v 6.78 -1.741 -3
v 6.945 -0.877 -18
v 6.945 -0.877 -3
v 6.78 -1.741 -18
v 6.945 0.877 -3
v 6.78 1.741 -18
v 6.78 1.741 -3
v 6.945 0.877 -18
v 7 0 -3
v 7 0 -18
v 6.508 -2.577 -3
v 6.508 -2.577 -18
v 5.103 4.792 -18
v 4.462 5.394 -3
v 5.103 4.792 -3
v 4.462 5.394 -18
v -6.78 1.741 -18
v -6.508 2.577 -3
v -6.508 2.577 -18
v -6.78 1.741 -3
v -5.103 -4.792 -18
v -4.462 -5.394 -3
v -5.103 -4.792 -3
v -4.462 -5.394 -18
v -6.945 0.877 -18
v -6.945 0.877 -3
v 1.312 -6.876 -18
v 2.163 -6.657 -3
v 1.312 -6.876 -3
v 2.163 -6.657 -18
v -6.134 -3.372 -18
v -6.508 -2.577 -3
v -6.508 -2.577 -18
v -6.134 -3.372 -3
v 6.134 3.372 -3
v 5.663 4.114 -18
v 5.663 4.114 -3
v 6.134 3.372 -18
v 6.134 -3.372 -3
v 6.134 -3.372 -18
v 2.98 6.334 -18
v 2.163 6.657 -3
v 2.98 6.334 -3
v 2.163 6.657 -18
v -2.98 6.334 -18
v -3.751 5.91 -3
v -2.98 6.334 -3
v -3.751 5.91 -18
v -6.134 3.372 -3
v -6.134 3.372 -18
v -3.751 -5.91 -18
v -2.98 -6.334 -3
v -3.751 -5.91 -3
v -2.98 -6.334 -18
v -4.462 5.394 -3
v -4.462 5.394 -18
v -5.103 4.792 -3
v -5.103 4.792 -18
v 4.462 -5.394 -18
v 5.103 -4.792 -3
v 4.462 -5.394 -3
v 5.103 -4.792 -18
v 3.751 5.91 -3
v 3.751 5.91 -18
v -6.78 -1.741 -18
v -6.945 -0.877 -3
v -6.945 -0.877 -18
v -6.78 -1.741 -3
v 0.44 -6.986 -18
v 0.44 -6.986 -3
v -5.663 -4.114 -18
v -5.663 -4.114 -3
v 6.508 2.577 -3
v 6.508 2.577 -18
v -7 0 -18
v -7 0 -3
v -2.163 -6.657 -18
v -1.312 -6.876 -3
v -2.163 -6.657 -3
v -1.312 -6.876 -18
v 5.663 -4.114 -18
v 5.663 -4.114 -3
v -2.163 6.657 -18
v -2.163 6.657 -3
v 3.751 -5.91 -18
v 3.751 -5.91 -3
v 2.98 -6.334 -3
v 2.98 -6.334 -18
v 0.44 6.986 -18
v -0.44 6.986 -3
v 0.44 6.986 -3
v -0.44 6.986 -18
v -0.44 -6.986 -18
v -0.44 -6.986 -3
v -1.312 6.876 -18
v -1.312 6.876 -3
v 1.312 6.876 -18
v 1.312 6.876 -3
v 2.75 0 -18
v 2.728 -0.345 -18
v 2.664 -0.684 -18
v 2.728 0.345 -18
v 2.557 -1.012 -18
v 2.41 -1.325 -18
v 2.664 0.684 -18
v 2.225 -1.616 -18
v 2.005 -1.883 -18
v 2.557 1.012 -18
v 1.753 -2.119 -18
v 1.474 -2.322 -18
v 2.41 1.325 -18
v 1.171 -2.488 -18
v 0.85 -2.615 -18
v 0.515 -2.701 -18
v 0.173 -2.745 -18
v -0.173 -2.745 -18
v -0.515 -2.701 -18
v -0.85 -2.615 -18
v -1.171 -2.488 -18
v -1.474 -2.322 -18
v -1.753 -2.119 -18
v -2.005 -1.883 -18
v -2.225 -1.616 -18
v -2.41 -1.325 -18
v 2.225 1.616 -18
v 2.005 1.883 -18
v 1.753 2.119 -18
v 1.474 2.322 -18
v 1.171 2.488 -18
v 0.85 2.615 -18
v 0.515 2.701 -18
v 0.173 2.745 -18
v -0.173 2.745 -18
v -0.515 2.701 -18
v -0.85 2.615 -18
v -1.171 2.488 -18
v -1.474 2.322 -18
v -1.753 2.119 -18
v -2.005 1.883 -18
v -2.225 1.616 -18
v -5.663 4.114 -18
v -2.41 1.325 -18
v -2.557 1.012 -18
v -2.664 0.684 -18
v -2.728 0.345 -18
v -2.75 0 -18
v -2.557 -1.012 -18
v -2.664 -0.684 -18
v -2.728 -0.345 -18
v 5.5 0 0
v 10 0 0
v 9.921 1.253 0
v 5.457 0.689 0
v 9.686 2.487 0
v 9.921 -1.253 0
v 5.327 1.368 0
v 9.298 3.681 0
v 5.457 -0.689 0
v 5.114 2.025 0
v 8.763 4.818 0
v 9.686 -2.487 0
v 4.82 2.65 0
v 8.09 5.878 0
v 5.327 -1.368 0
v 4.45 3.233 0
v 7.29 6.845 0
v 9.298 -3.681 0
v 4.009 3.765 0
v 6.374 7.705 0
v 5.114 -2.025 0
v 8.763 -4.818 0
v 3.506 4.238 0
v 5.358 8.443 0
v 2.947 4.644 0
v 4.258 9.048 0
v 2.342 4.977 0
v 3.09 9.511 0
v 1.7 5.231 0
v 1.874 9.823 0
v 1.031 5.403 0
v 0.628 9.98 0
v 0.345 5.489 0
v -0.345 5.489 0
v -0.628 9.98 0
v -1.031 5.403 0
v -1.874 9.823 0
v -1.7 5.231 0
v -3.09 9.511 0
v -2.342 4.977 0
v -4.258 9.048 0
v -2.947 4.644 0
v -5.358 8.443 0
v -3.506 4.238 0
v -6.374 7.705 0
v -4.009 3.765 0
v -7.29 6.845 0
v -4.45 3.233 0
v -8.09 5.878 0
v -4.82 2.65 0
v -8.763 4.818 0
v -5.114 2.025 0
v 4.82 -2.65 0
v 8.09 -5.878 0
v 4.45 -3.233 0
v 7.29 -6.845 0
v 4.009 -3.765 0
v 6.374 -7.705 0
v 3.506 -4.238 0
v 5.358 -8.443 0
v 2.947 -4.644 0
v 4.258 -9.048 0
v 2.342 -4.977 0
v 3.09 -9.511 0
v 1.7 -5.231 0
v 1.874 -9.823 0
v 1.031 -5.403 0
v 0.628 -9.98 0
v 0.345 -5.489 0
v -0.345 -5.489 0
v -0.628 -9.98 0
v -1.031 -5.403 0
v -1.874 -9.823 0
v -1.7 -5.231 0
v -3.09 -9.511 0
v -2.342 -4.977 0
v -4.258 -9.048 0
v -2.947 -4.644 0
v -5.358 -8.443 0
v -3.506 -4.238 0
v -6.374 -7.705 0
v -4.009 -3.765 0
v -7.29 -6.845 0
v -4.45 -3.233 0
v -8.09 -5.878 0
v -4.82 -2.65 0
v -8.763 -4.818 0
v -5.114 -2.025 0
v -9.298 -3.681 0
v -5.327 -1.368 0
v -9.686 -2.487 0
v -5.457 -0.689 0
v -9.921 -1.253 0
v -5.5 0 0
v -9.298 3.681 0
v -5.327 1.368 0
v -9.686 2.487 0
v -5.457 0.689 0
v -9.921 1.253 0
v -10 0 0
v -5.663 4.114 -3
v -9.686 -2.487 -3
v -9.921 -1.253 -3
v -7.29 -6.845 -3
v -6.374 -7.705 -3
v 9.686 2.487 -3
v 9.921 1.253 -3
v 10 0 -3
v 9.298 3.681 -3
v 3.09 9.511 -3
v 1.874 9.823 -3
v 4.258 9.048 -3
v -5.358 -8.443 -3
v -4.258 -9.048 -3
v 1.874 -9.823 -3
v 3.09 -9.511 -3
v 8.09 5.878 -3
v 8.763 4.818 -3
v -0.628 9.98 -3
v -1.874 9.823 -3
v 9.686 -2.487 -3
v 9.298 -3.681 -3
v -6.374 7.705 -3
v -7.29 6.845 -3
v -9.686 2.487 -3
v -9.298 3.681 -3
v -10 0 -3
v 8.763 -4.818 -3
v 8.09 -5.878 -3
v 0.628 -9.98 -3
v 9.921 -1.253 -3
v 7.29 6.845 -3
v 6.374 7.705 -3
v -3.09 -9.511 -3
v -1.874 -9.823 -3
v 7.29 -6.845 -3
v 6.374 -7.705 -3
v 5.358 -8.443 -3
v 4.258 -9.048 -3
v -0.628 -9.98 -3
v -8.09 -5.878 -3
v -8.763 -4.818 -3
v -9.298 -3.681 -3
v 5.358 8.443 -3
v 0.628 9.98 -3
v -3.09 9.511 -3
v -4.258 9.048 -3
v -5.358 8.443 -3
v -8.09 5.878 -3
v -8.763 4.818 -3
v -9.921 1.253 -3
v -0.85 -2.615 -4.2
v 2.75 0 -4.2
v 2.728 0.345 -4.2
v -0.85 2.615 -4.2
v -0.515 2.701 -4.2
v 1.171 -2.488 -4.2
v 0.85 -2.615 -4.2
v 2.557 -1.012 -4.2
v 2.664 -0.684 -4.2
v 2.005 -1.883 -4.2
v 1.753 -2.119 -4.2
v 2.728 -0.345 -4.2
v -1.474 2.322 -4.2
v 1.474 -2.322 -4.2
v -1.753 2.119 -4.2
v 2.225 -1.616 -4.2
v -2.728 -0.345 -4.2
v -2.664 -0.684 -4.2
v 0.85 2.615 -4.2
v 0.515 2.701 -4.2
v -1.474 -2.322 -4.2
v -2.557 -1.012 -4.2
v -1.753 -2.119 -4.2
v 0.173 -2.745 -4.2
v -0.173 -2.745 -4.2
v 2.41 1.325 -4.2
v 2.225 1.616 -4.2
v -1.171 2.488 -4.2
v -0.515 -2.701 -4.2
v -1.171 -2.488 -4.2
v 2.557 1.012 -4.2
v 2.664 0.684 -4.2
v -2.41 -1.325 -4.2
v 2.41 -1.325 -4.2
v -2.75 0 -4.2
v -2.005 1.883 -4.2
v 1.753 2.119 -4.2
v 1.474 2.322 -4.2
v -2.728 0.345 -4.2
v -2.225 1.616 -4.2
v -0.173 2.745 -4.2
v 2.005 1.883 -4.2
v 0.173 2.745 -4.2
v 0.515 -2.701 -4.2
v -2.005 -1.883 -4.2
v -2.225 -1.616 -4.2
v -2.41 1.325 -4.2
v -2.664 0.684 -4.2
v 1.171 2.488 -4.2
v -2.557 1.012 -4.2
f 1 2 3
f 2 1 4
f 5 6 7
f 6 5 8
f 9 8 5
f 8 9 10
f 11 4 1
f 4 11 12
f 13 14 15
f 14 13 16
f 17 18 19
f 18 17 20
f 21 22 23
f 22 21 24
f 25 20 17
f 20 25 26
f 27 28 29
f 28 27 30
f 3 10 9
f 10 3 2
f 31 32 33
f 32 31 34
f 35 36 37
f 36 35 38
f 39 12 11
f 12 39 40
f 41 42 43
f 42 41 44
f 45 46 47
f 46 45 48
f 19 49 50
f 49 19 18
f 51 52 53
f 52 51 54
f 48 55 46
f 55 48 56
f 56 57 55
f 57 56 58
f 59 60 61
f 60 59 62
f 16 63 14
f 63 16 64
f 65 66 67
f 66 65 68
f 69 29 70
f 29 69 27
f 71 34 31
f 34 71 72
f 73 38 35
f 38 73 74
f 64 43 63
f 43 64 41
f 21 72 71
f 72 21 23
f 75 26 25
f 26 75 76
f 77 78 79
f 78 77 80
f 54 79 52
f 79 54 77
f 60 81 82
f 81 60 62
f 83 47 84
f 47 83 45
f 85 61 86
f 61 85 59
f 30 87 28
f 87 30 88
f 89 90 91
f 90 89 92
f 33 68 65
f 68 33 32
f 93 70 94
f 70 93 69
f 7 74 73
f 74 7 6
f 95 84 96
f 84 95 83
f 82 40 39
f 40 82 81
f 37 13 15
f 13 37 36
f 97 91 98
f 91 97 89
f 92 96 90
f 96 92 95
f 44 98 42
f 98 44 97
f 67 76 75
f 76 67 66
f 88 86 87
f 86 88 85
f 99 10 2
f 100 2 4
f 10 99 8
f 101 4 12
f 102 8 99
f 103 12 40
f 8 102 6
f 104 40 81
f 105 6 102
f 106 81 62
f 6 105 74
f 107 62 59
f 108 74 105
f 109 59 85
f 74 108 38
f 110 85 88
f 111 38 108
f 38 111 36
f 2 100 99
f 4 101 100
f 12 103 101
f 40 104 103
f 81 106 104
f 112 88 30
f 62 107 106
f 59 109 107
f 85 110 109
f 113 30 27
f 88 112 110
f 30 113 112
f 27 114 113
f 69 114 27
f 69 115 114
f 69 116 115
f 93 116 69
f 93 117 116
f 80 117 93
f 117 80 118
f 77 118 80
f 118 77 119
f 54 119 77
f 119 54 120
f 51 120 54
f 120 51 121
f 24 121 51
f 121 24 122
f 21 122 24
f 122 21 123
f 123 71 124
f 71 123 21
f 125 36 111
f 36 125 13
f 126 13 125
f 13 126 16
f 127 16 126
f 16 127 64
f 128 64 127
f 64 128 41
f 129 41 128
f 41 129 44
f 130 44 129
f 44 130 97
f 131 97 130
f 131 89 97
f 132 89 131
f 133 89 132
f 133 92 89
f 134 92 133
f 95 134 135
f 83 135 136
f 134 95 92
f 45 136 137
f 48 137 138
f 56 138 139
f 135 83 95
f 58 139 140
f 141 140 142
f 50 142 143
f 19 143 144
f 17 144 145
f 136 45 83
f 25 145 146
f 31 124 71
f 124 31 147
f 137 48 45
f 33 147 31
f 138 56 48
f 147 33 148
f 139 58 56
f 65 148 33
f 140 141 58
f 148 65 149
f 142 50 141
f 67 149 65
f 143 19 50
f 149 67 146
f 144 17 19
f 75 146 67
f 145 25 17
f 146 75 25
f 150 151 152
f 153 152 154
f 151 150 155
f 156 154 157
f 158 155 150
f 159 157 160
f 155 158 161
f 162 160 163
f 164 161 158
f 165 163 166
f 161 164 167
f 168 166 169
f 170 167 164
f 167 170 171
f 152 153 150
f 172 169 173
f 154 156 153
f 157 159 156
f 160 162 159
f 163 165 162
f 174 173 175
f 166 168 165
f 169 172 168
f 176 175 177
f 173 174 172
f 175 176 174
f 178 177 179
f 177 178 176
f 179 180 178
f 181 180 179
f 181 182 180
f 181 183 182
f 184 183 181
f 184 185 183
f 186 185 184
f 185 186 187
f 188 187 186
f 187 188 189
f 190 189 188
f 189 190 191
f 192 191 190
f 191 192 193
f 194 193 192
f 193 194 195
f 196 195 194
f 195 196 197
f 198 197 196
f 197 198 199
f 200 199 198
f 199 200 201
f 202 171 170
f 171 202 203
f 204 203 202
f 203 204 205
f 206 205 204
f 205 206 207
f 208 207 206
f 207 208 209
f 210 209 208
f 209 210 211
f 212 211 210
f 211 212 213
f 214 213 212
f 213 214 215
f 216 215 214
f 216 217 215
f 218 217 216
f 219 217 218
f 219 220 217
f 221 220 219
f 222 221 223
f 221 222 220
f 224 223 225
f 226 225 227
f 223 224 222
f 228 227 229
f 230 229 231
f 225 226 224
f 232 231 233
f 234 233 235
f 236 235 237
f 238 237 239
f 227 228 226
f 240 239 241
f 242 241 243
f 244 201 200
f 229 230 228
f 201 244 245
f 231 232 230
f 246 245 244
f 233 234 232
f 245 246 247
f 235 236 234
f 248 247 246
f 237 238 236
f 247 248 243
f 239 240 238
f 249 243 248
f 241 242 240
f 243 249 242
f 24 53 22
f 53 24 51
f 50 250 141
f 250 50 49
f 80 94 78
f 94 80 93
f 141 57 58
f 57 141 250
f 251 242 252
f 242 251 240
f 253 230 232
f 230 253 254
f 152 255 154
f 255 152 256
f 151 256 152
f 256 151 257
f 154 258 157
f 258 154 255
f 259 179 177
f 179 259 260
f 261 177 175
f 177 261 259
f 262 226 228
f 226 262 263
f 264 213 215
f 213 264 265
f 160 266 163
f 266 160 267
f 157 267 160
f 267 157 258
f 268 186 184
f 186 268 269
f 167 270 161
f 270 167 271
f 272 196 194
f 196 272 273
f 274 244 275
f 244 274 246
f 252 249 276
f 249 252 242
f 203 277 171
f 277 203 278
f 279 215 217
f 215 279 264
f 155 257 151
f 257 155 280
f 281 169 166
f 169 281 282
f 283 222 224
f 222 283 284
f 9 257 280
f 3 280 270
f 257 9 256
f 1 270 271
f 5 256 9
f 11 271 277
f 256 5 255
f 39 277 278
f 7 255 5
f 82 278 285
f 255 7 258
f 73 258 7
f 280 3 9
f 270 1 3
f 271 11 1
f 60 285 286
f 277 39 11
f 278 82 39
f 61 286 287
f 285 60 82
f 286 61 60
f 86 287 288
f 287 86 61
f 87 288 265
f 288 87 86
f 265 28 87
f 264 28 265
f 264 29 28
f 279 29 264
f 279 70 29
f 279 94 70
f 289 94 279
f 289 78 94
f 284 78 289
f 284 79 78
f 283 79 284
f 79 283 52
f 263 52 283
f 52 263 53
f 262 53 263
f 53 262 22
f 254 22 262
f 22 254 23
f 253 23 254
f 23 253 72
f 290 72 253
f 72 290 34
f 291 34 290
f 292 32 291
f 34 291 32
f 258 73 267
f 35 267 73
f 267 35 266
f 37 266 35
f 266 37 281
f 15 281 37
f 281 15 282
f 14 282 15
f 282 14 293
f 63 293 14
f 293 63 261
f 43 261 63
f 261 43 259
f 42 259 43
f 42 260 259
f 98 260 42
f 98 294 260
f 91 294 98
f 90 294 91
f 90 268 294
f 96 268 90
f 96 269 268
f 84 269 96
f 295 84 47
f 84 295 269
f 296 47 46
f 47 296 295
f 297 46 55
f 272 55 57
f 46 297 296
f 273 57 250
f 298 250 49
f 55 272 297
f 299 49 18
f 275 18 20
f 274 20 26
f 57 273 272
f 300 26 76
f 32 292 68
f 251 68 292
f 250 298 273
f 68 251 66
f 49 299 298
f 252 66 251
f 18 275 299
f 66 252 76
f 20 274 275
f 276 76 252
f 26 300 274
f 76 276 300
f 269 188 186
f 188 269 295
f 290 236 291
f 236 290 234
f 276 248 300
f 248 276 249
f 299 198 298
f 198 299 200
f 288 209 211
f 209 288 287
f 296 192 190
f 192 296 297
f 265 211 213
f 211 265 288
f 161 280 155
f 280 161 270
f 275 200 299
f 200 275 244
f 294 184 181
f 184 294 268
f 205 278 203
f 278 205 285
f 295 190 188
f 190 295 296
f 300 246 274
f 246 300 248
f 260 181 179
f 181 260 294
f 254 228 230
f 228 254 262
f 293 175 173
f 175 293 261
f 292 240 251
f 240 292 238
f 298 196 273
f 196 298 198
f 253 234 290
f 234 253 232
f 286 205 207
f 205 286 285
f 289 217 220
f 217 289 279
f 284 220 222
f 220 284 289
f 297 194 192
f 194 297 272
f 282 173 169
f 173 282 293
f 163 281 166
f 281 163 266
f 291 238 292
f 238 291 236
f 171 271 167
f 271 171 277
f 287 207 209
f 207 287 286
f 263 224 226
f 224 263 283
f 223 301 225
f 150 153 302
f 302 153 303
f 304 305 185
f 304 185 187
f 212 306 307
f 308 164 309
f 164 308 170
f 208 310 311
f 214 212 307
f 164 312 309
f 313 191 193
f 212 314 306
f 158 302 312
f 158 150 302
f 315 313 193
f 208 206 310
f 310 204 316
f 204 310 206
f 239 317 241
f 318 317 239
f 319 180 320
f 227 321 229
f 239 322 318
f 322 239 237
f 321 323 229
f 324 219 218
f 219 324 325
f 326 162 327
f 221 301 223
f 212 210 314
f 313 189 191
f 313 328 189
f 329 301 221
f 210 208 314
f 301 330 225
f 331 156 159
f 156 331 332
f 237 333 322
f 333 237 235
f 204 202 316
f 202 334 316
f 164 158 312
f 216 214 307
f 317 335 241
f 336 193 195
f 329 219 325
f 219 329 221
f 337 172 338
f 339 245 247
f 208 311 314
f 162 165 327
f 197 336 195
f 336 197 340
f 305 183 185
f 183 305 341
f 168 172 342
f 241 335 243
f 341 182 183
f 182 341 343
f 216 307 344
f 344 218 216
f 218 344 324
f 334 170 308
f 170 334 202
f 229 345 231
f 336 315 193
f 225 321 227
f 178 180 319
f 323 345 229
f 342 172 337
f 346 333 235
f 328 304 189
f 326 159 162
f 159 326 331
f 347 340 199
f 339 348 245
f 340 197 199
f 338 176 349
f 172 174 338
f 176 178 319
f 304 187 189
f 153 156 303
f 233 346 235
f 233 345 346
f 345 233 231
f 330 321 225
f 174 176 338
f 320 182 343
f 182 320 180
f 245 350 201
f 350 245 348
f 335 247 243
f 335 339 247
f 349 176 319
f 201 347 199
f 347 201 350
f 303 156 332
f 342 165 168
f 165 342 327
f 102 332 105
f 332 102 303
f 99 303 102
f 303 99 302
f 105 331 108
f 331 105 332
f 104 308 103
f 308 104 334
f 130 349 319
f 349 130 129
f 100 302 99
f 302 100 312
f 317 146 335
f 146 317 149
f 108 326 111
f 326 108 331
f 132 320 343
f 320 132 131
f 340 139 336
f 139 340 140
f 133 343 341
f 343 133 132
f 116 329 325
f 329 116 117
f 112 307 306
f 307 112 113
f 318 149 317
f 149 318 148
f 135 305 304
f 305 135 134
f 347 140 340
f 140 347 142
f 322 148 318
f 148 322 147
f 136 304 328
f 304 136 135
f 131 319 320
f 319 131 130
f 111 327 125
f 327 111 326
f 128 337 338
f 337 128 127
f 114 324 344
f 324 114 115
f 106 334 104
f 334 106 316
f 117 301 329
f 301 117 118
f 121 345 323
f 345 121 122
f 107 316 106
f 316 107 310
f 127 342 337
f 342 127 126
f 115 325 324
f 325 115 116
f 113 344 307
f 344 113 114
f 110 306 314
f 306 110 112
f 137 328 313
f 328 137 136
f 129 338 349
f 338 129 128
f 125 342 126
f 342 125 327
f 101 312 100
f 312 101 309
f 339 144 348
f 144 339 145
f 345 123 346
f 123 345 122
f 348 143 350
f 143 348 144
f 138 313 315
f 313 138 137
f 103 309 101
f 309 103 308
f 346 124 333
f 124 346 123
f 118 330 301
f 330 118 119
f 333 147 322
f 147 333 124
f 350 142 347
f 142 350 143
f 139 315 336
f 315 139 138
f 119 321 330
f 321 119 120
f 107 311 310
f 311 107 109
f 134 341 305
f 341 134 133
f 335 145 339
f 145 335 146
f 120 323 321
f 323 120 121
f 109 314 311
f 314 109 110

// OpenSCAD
$fn = 50;


difference() {
	union() {
		translate(v = [0, 0, -18.0000000000]) {
			cylinder(h = 18, r = 7.0000000000);
		}
		translate(v = [0, 0, -3.0000000000]) {
			cylinder(h = 3, r = 10.0000000000);
		}
	}
	union() {
		translate(v = [0, 0, 0]) {
			rotate(a = [0, 0, 0]) {
				difference() {
					union() {
						#translate(v = [0, 0, -18.0000000000]) {
							cylinder(h = 18, r = 2.2500000000);
						}
						#translate(v = [0, 0, -4.2000000000]) {
							cylinder(h = 4.2000000000, r = 7.0000000000, r1 = 2.7500000000, r2 = 5.5000000000);
						}
						#translate(v = [0, 0, -18.0000000000]) {
							cylinder(h = 18, r = 2.7500000000);
						}
						#translate(v = [0, 0, -18.0000000000]) {
							cylinder(h = 18, r = 2.2500000000);
						}
					}
					union();
				}
			}
		}
	}
}
